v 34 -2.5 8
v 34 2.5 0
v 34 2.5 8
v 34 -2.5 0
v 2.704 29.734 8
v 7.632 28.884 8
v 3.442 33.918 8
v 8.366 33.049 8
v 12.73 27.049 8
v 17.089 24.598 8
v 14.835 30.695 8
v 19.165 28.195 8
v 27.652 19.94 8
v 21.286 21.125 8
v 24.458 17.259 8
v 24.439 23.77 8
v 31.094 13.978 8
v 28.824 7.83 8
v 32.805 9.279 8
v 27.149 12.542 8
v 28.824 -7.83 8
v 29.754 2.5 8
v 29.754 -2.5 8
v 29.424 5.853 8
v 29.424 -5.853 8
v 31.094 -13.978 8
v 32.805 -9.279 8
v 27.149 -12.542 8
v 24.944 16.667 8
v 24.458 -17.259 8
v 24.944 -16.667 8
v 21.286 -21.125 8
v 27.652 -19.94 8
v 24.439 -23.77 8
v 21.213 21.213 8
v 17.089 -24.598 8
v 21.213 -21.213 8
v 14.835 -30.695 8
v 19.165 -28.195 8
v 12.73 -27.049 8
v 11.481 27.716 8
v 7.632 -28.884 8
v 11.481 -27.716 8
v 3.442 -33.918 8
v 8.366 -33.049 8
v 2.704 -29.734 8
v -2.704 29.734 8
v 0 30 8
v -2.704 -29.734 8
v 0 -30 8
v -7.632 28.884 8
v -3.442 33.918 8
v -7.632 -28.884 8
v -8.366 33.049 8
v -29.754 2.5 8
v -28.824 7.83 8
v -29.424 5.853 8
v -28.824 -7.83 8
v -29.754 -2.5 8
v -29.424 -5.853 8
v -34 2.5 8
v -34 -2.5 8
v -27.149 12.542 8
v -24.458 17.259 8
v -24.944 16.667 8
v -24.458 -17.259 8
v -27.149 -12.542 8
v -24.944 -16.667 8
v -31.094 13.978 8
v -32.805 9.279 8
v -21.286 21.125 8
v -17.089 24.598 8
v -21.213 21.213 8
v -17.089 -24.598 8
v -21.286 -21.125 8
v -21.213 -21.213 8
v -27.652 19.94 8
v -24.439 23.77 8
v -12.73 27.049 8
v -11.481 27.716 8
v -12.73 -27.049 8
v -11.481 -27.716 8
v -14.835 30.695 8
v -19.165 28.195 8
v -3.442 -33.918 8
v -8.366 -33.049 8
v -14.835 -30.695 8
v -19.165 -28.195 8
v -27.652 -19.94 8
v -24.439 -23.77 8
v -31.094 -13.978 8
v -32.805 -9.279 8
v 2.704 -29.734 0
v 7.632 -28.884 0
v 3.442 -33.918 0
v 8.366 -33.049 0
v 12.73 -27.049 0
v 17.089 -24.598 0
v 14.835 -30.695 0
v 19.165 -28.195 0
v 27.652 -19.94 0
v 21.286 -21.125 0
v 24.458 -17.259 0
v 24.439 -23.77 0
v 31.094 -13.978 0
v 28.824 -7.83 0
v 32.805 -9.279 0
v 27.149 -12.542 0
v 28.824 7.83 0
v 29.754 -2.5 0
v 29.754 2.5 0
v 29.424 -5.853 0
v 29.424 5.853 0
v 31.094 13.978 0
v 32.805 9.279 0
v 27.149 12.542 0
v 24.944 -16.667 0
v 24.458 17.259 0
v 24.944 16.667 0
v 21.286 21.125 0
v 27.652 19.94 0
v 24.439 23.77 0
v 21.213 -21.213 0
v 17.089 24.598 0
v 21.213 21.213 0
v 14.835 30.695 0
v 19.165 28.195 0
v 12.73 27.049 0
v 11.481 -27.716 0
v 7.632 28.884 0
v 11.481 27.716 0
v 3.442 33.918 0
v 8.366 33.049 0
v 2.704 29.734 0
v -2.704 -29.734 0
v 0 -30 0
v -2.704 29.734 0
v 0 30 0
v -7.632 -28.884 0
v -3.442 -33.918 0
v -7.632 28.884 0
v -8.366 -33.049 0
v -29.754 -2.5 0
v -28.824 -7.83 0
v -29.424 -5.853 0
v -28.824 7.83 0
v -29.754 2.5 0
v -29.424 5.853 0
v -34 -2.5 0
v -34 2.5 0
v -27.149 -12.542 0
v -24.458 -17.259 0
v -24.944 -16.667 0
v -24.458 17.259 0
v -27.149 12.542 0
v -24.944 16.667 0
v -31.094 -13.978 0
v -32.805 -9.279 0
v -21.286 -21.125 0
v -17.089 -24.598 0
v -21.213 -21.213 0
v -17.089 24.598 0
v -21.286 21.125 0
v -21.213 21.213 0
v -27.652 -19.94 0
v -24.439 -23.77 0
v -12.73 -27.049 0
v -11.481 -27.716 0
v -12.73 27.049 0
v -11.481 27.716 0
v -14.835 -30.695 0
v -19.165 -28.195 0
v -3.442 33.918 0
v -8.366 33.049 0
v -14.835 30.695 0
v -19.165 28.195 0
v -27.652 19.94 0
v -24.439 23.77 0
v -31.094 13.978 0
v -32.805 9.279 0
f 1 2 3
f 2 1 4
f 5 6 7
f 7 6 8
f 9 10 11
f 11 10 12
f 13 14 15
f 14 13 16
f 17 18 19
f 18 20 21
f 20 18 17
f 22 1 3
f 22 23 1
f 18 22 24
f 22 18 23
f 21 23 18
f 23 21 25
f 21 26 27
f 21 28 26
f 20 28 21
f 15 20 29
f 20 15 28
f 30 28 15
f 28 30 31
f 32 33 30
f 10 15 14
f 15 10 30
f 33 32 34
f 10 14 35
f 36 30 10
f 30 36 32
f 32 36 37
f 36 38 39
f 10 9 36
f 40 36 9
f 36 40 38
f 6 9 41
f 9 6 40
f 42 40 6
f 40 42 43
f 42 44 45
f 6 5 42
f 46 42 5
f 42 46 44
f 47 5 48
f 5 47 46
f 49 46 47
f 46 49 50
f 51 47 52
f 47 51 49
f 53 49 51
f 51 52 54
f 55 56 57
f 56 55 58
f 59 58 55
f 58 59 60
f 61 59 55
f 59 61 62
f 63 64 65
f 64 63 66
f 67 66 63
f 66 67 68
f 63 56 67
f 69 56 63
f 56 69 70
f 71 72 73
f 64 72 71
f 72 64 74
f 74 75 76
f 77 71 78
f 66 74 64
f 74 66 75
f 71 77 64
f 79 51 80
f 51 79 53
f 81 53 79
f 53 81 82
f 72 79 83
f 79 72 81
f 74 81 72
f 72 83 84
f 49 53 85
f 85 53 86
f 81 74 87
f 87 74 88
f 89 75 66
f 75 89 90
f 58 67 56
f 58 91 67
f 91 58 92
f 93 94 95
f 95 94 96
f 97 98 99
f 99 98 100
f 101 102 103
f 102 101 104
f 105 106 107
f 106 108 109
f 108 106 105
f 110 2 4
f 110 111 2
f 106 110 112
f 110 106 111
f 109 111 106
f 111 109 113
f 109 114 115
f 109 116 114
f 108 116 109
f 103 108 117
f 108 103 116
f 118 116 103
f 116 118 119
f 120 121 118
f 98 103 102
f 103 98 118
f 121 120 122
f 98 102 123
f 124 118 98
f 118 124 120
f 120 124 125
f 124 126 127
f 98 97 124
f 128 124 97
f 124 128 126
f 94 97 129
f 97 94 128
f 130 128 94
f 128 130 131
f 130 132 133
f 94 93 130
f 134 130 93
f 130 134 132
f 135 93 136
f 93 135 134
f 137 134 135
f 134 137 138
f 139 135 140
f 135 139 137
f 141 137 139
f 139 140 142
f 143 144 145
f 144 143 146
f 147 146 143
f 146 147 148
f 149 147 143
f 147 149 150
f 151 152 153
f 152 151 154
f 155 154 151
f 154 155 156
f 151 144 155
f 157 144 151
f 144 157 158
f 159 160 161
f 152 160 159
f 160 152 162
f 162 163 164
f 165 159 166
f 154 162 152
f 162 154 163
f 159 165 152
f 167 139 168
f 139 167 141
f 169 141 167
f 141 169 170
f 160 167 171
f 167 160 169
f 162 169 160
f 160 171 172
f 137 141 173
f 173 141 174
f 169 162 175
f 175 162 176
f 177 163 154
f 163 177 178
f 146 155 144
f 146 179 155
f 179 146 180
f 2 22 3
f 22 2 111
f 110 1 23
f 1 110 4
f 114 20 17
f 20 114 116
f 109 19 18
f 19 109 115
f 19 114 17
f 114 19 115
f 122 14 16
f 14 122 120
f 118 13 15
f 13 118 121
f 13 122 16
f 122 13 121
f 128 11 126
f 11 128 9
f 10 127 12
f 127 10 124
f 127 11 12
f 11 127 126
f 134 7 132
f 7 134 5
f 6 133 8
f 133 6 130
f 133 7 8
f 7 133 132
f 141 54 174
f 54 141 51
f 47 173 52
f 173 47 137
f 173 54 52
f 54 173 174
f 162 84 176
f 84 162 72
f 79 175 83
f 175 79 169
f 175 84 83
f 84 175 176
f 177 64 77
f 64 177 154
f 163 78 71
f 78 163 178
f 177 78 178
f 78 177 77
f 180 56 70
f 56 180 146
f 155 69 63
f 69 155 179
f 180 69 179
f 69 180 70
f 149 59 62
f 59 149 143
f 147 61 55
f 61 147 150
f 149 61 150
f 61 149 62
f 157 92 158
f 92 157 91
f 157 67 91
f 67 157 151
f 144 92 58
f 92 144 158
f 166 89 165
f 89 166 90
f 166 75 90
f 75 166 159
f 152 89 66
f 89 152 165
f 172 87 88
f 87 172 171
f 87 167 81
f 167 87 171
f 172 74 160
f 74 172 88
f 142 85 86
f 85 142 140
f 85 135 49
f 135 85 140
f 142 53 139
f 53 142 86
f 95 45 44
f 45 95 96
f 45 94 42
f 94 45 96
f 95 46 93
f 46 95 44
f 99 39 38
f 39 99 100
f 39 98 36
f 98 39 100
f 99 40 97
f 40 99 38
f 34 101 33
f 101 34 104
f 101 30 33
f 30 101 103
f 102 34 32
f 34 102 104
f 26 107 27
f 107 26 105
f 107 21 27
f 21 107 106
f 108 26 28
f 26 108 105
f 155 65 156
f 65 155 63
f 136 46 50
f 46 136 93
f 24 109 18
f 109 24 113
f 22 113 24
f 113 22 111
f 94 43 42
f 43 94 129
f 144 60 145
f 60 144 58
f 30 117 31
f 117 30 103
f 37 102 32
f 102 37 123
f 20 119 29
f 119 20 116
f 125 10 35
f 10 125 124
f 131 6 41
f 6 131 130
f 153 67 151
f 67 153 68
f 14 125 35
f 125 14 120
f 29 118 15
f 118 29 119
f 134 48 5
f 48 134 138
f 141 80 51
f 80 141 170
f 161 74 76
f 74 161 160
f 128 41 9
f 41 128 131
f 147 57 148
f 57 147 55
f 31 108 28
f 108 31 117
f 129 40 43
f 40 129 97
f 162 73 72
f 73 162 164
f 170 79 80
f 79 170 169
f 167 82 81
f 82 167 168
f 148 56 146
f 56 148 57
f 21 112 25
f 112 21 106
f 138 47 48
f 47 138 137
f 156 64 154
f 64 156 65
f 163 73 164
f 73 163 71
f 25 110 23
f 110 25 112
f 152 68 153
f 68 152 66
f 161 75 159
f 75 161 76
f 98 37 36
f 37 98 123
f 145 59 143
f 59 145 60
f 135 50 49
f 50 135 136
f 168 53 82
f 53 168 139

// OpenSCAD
$fn = 32;

// ----------------------------------------------------------------------
// Spur blank: plain gear blank
// ----------------------------------------------------------------------

// --- parameters (mm) ---
disc_r = 30;              // blank root radius
disc_t = 8;               // blank thickness
n_teeth = 18;             // stub tooth count
tooth_w = 5;              // tooth width at the root
tooth_h = 4;              // tooth height above the root

out_r = disc_r + tooth_h;  // tip radius
bbox_x = 68.0;  // measured width over the teeth
bbox_y = 67.84;  // measured depth over the teeth

union() {
  cylinder(r = disc_r, h = disc_t);
  for (i = [0 : n_teeth - 1])
    rotate([0, 0, i * 360 / n_teeth])
      translate([disc_r - 1, -tooth_w / 2, 0])
        cube([tooth_h + 1, tooth_w, disc_t]);
}
